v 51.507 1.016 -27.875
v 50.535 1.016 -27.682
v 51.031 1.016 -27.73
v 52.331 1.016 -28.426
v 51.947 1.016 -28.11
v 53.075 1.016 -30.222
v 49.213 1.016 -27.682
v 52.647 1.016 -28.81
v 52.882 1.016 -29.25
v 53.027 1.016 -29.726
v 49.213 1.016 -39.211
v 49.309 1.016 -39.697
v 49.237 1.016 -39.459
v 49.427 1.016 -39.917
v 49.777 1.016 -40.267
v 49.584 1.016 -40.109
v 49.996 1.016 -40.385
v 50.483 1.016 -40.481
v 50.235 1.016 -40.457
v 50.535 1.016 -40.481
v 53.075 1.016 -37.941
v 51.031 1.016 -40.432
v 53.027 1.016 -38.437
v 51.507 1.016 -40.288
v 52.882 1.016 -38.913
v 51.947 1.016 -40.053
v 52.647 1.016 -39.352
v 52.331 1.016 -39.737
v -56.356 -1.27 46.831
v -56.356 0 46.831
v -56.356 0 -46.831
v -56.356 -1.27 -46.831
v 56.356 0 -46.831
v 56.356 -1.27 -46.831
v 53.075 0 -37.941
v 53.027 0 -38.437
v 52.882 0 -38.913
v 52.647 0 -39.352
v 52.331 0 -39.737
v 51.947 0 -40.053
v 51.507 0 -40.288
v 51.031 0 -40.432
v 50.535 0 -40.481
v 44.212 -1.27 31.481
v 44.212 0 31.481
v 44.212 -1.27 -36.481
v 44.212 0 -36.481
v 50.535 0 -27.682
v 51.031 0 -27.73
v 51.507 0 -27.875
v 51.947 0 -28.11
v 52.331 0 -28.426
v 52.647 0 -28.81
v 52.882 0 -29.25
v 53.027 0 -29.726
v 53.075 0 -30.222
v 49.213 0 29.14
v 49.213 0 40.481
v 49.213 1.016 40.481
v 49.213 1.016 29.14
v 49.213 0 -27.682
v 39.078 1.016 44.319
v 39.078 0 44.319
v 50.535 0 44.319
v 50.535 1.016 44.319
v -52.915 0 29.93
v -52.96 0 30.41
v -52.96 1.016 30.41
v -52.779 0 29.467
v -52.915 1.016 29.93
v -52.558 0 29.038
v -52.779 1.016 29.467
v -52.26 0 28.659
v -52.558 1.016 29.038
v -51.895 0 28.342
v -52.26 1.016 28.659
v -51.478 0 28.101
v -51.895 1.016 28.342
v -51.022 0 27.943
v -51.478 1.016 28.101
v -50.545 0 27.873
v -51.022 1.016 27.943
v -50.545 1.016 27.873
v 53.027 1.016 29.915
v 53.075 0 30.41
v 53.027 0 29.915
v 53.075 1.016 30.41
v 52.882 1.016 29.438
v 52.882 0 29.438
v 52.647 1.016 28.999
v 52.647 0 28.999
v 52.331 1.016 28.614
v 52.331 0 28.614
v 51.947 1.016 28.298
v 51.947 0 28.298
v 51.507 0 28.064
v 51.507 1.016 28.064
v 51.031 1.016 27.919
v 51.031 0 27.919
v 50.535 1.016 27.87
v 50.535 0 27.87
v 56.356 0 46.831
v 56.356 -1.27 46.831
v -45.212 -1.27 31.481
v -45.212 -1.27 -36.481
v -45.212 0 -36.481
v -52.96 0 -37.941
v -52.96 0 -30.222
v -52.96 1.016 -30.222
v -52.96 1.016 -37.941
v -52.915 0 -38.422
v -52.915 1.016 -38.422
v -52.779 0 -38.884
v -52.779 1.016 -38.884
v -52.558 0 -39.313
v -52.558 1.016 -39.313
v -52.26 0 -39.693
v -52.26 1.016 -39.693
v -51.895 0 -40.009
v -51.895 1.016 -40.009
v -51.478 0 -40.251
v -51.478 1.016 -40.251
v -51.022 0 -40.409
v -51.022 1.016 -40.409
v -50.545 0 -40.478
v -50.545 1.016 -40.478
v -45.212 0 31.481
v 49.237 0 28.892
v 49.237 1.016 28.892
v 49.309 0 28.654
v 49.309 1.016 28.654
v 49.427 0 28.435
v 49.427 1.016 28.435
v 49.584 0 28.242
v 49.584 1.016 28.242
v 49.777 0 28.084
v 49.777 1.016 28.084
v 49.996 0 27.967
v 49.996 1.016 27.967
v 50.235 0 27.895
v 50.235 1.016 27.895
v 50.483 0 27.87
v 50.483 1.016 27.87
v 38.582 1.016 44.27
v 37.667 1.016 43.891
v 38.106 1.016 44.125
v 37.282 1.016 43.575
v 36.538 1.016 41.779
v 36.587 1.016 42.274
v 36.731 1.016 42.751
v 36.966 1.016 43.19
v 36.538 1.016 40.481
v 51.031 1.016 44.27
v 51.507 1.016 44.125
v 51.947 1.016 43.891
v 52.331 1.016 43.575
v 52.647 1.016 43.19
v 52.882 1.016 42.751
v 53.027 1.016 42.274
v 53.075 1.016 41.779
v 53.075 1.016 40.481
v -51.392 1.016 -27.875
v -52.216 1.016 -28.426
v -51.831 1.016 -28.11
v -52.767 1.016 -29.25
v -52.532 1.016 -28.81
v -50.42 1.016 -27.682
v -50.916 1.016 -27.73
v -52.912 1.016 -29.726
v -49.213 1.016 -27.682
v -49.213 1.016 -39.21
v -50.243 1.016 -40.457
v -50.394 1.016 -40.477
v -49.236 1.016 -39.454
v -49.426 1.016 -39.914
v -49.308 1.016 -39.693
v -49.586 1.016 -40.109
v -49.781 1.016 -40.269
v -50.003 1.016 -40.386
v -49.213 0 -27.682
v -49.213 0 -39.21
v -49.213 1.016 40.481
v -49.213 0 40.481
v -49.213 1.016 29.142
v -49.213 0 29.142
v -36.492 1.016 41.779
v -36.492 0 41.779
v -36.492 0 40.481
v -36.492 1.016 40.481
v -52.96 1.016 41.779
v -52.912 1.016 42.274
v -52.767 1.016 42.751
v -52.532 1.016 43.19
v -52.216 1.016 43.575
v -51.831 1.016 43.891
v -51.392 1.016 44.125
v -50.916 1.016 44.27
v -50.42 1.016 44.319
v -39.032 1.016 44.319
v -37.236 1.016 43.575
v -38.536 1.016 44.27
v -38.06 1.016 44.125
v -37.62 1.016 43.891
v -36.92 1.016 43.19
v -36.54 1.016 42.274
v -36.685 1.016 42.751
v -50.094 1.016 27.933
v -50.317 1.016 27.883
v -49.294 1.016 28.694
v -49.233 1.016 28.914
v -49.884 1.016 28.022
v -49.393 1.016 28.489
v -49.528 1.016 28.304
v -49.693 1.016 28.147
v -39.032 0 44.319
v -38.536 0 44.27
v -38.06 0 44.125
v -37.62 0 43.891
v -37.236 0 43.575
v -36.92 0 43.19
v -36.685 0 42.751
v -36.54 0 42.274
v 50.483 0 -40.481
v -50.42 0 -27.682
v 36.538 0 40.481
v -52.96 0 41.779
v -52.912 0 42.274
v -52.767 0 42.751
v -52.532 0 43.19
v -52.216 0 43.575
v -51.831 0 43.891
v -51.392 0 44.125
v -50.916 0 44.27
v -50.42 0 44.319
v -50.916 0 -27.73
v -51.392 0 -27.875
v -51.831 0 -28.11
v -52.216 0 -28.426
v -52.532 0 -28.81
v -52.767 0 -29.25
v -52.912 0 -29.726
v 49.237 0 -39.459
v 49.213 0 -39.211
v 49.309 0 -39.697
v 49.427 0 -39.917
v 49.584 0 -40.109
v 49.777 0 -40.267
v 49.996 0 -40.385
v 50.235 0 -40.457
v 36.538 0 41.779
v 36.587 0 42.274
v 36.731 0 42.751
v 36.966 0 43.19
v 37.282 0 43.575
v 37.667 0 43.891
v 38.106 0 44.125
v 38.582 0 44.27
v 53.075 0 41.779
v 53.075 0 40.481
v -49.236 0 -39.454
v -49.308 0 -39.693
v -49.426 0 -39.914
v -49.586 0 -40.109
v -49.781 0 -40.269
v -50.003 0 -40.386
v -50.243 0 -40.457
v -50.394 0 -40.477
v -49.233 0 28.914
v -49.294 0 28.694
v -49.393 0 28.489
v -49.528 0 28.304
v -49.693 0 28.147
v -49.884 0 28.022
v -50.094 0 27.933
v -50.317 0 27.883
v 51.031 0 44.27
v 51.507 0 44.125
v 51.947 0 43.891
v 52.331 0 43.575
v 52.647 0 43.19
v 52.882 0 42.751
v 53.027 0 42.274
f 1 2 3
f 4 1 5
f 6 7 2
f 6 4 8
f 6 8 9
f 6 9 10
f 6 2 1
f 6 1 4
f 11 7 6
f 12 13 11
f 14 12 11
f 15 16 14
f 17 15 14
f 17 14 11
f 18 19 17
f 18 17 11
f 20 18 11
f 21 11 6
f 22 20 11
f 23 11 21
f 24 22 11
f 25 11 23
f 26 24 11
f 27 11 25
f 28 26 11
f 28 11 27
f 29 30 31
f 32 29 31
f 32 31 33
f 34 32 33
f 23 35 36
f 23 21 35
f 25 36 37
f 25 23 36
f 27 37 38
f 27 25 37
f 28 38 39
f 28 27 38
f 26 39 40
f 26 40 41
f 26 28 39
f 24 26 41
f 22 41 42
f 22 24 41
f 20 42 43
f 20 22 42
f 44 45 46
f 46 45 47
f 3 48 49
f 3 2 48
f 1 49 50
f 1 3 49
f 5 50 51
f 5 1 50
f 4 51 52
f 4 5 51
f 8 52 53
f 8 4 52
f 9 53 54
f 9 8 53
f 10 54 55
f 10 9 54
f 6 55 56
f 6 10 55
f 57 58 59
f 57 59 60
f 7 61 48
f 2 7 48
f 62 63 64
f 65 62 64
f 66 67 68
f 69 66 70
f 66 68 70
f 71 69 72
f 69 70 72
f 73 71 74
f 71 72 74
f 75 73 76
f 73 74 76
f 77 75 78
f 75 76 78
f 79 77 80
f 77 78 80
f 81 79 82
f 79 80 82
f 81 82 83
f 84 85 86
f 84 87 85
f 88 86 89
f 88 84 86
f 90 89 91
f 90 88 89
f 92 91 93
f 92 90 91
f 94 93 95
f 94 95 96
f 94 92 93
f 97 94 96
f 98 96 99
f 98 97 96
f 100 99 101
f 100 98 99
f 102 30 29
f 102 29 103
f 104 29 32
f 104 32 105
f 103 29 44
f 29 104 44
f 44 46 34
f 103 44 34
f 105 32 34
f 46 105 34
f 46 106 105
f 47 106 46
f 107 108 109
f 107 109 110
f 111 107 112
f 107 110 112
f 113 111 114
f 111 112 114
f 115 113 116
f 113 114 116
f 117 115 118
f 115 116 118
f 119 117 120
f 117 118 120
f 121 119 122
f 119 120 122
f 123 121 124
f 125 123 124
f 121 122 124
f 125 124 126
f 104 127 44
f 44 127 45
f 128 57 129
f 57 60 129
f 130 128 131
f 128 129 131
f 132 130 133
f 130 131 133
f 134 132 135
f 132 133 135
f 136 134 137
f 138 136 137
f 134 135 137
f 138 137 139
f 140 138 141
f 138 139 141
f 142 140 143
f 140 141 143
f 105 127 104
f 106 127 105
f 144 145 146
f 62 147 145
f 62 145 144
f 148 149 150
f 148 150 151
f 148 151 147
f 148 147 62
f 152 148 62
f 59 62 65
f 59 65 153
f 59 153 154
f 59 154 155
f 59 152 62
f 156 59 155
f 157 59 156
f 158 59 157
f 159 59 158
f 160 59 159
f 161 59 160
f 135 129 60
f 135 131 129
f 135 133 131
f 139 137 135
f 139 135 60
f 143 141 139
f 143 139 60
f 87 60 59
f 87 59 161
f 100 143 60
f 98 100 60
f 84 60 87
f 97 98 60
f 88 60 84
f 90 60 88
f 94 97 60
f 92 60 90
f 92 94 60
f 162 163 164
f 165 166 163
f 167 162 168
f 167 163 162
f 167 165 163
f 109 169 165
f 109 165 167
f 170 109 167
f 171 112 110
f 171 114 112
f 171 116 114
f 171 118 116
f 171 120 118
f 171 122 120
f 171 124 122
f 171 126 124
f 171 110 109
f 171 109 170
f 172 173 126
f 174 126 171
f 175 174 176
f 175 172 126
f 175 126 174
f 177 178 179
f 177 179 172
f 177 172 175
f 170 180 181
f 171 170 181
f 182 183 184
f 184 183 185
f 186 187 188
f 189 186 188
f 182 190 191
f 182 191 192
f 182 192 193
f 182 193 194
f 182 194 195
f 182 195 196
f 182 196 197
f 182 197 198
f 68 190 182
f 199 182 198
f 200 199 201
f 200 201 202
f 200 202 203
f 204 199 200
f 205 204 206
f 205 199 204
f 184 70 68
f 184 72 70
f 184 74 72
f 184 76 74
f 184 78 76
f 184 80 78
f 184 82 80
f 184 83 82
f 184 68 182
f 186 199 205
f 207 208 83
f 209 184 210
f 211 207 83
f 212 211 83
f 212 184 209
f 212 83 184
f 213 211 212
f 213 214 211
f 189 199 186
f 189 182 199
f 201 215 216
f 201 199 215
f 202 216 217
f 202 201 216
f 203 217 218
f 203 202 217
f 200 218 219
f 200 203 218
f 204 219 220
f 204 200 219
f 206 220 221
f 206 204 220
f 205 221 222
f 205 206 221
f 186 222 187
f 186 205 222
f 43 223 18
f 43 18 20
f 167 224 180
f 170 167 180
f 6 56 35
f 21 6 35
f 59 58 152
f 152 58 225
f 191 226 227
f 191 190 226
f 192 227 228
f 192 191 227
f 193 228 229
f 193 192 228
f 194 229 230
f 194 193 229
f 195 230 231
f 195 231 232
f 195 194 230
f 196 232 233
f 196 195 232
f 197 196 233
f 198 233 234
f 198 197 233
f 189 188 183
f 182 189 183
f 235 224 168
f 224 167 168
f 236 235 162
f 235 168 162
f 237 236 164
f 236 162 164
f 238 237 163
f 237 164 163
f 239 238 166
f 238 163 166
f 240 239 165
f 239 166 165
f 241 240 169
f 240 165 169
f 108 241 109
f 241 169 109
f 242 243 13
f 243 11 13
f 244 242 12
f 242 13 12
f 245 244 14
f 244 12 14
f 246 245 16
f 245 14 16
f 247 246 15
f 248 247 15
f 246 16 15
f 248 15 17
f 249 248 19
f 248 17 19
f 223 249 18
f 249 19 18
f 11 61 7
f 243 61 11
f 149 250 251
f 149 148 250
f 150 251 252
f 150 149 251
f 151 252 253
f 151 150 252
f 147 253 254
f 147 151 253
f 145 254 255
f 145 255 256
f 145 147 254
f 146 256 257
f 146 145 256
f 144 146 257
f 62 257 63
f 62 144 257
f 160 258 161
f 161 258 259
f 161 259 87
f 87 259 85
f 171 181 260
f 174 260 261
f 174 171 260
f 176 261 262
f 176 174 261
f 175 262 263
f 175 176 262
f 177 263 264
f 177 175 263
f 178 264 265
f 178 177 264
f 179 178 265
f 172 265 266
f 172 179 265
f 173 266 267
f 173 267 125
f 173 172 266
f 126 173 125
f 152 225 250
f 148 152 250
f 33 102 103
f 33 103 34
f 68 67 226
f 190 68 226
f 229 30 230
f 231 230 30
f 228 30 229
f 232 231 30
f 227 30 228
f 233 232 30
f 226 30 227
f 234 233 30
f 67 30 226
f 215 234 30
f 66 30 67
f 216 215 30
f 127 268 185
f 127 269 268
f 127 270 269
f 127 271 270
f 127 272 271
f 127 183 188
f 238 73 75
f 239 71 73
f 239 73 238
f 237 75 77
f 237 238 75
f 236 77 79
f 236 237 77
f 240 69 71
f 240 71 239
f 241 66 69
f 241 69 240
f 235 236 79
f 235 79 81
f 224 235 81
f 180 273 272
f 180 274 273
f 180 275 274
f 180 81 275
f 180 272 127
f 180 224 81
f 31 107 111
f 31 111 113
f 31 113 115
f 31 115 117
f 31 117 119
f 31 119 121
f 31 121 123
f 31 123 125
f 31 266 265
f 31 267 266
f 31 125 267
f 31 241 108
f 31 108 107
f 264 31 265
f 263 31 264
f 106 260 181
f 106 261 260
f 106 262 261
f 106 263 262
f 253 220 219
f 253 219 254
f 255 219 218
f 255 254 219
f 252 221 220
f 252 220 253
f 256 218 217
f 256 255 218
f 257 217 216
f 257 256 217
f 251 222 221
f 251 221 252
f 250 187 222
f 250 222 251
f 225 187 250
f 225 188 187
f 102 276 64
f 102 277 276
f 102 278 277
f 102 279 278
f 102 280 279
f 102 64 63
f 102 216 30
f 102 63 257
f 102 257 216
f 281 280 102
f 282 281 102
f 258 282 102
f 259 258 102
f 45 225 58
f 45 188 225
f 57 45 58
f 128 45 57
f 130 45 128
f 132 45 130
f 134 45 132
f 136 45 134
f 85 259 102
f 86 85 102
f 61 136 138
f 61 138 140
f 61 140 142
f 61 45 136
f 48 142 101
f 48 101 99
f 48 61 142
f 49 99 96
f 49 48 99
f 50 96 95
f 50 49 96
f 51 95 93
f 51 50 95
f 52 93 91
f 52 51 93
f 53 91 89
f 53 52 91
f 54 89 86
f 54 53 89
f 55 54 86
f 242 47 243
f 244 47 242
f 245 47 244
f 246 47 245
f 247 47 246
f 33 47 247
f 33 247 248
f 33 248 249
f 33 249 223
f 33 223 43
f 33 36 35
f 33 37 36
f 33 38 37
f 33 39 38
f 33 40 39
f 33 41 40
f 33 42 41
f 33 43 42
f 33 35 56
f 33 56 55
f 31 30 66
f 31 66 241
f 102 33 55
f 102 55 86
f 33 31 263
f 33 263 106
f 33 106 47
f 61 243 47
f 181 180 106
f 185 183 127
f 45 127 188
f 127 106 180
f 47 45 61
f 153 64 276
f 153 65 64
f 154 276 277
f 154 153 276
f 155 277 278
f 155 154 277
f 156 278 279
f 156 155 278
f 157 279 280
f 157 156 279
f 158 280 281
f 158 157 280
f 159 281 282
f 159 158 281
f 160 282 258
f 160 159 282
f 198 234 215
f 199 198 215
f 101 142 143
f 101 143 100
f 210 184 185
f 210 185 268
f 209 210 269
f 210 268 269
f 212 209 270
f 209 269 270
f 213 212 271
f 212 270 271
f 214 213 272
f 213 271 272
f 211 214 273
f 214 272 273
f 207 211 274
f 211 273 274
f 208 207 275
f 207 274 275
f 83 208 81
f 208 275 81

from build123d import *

# Parameters (mm, degrees)
BOSS_EXTRUDE2_DEPTH   = 1.016
BOSS_EXTRUDE2_2_DEPTH = 1.016
SKETCH2_W             = 3.747831998
SKETCH2_H             = 12.799678195
BOSS_EXTRUDE2_3_DEPTH = 1.016
SKETCH2_W_2           = 3.862926877
BOSS_EXTRUDE2_4_DEPTH = 1.016
SKETCH2_7_W           = 112.7125
SKETCH2_7_H           = 93.6625
BOSS_EXTRUDE14_DEPTH  = 1.27
SKETCH2_8_W           = 89.425
SKETCH2_8_H           = 67.9625
CUT_EXTRUDE4_DEPTH    = 1.27
FILLET5_R             = 2.54
FILLET6_R             = 2.54
FILLET7_R             = 2.54
FILLET8_R             = 2.54
FILLET9_R             = 1.27
FILLET10_R            = 1.27
FILLET11_R            = 1.27
FILLET12_R            = 1.27


with BuildPart() as part:
    # Sketch2 → Boss-Extrude2 (new body)
    with BuildSketch(Plane(origin=(0, 0, 0), x_dir=(1, 0, 0), z_dir=(0, 1, 0))):
        Polygon((-52.960331998, -27.870210865), (-52.960331998, -44.318627665), (-36.491625106, -44.318627665), (-36.491625106, -40.48125), (-49.2125, -40.48125), (-49.2125, -27.870210865), align=None)
    extrude(amount=BOSS_EXTRUDE2_DEPTH)



with BuildPart() as body_2:
    # Sketch2 → Boss-Extrude2 2 (new body)
    with BuildSketch(Plane(origin=(0, 0, 0), x_dir=(1, 0, 0), z_dir=(0, 1, 0))):
        Polygon((49.2125, -40.48125), (36.537927314, -40.48125), (36.537927314, -44.318627665), (53.075426877, -44.318627665), (53.075426877, -27.870210865), (49.2125, -27.870210865), align=None)
    extrude(amount=BOSS_EXTRUDE2_2_DEPTH)


with BuildPart() as body_3:
    # Sketch2 → Boss-Extrude2 3 (new body)
    with BuildSketch(Plane(origin=(0, 0, 0), x_dir=(1, 0, 0), z_dir=(0, 1, 0))):
        with Locations((-51.086415999, 34.081410903)):
            Rectangle(SKETCH2_W, SKETCH2_H)
    extrude(amount=BOSS_EXTRUDE2_3_DEPTH)


with BuildPart() as body_4:
    # Sketch2 → Boss-Extrude2 4 (new body)
    with BuildSketch(Plane(origin=(0, 0, 0), x_dir=(1, 0, 0), z_dir=(0, 1, 0))):
        with Locations((51.143963439, 34.081410903)):
            Rectangle(SKETCH2_W_2, SKETCH2_H)
    extrude(amount=BOSS_EXTRUDE2_4_DEPTH)


with BuildPart() as part_1:
    add(part.part)

    add(body_2.part)  # Boss-Extrude14 merges body 2

    add(body_3.part)  # Boss-Extrude14 merges body 3

    add(body_4.part)  # Boss-Extrude14 merges body 4
    # Sketch2<7> → Boss-Extrude14 (add)
    with BuildSketch(Plane(origin=(0, 0, 0), x_dir=(1, 0, 0), z_dir=(0, 1, 0))):
        Rectangle(SKETCH2_7_W, SKETCH2_7_H)
    extrude(amount=-BOSS_EXTRUDE14_DEPTH)

    # Sketch2<8> → Cut-Extrude4 (cut)
    with BuildSketch(Plane(origin=(0, 0, 0), x_dir=(1, 0, 0), z_dir=(0, 1, 0))):
        with Locations((-0.5, 2.5)):
            Rectangle(SKETCH2_8_W, SKETCH2_8_H)
    extrude(amount=-CUT_EXTRUDE4_DEPTH, mode=Mode.SUBTRACT)

    # Fillet5
    fillet5_edges = [part_1.edges().sort_by_distance(p)[0] for p in [
        (-52.960331998, 0.508, -27.681571805),
        (-52.960331998, 0.508, -40.48125),
    ]]
    fillet(fillet5_edges, radius=FILLET5_R)

    # Fillet6
    fillet6_edges = [part_1.edges().sort_by_distance(p)[0] for p in [
        (53.075426877, 0.508, -27.681571805),
        (53.075426877, 0.508, -40.48125),
    ]]
    fillet(fillet6_edges, radius=FILLET6_R)

    # Fillet7
    fillet7_edges = [part_1.edges().sort_by_distance(p)[0] for p in [
        (-52.960331998, 0.508, 27.870210865),
        (-52.960331998, 0.508, 44.318627665),
        (-36.491625106, 0.508, 44.318627665),
    ]]
    fillet(fillet7_edges, radius=FILLET7_R)

    # Fillet8
    fillet8_edges = [part_1.edges().sort_by_distance(p)[0] for p in [
        (36.537927314, 0.508, 44.318627665),
        (53.075426877, 0.508, 44.318627665),
        (53.075426877, 0.508, 27.870210865),
    ]]
    fillet(fillet8_edges, radius=FILLET8_R)

    # Fillet9
    fillet9_edges = [part_1.edges().sort_by_distance(p)[0] for p in [
        (-49.2125, 0.508, 27.870210865),
    ]]
    fillet(fillet9_edges, radius=FILLET9_R)

    # Fillet10
    fillet10_edges = [part_1.edges().sort_by_distance(p)[0] for p in [
        (-49.2125, 0.508, -40.48125),
    ]]
    fillet(fillet10_edges, radius=FILLET10_R)

    # Fillet11
    fillet11_edges = [part_1.edges().sort_by_distance(p)[0] for p in [
        (49.2125, 0.508, 27.870210865),
    ]]
    fillet(fillet11_edges, radius=FILLET11_R)

    # Fillet12
    fillet12_edges = [part_1.edges().sort_by_distance(p)[0] for p in [
        (49.2125, 0.508, -40.48125),
    ]]
    fillet(fillet12_edges, radius=FILLET12_R)


solid = part_1.part
